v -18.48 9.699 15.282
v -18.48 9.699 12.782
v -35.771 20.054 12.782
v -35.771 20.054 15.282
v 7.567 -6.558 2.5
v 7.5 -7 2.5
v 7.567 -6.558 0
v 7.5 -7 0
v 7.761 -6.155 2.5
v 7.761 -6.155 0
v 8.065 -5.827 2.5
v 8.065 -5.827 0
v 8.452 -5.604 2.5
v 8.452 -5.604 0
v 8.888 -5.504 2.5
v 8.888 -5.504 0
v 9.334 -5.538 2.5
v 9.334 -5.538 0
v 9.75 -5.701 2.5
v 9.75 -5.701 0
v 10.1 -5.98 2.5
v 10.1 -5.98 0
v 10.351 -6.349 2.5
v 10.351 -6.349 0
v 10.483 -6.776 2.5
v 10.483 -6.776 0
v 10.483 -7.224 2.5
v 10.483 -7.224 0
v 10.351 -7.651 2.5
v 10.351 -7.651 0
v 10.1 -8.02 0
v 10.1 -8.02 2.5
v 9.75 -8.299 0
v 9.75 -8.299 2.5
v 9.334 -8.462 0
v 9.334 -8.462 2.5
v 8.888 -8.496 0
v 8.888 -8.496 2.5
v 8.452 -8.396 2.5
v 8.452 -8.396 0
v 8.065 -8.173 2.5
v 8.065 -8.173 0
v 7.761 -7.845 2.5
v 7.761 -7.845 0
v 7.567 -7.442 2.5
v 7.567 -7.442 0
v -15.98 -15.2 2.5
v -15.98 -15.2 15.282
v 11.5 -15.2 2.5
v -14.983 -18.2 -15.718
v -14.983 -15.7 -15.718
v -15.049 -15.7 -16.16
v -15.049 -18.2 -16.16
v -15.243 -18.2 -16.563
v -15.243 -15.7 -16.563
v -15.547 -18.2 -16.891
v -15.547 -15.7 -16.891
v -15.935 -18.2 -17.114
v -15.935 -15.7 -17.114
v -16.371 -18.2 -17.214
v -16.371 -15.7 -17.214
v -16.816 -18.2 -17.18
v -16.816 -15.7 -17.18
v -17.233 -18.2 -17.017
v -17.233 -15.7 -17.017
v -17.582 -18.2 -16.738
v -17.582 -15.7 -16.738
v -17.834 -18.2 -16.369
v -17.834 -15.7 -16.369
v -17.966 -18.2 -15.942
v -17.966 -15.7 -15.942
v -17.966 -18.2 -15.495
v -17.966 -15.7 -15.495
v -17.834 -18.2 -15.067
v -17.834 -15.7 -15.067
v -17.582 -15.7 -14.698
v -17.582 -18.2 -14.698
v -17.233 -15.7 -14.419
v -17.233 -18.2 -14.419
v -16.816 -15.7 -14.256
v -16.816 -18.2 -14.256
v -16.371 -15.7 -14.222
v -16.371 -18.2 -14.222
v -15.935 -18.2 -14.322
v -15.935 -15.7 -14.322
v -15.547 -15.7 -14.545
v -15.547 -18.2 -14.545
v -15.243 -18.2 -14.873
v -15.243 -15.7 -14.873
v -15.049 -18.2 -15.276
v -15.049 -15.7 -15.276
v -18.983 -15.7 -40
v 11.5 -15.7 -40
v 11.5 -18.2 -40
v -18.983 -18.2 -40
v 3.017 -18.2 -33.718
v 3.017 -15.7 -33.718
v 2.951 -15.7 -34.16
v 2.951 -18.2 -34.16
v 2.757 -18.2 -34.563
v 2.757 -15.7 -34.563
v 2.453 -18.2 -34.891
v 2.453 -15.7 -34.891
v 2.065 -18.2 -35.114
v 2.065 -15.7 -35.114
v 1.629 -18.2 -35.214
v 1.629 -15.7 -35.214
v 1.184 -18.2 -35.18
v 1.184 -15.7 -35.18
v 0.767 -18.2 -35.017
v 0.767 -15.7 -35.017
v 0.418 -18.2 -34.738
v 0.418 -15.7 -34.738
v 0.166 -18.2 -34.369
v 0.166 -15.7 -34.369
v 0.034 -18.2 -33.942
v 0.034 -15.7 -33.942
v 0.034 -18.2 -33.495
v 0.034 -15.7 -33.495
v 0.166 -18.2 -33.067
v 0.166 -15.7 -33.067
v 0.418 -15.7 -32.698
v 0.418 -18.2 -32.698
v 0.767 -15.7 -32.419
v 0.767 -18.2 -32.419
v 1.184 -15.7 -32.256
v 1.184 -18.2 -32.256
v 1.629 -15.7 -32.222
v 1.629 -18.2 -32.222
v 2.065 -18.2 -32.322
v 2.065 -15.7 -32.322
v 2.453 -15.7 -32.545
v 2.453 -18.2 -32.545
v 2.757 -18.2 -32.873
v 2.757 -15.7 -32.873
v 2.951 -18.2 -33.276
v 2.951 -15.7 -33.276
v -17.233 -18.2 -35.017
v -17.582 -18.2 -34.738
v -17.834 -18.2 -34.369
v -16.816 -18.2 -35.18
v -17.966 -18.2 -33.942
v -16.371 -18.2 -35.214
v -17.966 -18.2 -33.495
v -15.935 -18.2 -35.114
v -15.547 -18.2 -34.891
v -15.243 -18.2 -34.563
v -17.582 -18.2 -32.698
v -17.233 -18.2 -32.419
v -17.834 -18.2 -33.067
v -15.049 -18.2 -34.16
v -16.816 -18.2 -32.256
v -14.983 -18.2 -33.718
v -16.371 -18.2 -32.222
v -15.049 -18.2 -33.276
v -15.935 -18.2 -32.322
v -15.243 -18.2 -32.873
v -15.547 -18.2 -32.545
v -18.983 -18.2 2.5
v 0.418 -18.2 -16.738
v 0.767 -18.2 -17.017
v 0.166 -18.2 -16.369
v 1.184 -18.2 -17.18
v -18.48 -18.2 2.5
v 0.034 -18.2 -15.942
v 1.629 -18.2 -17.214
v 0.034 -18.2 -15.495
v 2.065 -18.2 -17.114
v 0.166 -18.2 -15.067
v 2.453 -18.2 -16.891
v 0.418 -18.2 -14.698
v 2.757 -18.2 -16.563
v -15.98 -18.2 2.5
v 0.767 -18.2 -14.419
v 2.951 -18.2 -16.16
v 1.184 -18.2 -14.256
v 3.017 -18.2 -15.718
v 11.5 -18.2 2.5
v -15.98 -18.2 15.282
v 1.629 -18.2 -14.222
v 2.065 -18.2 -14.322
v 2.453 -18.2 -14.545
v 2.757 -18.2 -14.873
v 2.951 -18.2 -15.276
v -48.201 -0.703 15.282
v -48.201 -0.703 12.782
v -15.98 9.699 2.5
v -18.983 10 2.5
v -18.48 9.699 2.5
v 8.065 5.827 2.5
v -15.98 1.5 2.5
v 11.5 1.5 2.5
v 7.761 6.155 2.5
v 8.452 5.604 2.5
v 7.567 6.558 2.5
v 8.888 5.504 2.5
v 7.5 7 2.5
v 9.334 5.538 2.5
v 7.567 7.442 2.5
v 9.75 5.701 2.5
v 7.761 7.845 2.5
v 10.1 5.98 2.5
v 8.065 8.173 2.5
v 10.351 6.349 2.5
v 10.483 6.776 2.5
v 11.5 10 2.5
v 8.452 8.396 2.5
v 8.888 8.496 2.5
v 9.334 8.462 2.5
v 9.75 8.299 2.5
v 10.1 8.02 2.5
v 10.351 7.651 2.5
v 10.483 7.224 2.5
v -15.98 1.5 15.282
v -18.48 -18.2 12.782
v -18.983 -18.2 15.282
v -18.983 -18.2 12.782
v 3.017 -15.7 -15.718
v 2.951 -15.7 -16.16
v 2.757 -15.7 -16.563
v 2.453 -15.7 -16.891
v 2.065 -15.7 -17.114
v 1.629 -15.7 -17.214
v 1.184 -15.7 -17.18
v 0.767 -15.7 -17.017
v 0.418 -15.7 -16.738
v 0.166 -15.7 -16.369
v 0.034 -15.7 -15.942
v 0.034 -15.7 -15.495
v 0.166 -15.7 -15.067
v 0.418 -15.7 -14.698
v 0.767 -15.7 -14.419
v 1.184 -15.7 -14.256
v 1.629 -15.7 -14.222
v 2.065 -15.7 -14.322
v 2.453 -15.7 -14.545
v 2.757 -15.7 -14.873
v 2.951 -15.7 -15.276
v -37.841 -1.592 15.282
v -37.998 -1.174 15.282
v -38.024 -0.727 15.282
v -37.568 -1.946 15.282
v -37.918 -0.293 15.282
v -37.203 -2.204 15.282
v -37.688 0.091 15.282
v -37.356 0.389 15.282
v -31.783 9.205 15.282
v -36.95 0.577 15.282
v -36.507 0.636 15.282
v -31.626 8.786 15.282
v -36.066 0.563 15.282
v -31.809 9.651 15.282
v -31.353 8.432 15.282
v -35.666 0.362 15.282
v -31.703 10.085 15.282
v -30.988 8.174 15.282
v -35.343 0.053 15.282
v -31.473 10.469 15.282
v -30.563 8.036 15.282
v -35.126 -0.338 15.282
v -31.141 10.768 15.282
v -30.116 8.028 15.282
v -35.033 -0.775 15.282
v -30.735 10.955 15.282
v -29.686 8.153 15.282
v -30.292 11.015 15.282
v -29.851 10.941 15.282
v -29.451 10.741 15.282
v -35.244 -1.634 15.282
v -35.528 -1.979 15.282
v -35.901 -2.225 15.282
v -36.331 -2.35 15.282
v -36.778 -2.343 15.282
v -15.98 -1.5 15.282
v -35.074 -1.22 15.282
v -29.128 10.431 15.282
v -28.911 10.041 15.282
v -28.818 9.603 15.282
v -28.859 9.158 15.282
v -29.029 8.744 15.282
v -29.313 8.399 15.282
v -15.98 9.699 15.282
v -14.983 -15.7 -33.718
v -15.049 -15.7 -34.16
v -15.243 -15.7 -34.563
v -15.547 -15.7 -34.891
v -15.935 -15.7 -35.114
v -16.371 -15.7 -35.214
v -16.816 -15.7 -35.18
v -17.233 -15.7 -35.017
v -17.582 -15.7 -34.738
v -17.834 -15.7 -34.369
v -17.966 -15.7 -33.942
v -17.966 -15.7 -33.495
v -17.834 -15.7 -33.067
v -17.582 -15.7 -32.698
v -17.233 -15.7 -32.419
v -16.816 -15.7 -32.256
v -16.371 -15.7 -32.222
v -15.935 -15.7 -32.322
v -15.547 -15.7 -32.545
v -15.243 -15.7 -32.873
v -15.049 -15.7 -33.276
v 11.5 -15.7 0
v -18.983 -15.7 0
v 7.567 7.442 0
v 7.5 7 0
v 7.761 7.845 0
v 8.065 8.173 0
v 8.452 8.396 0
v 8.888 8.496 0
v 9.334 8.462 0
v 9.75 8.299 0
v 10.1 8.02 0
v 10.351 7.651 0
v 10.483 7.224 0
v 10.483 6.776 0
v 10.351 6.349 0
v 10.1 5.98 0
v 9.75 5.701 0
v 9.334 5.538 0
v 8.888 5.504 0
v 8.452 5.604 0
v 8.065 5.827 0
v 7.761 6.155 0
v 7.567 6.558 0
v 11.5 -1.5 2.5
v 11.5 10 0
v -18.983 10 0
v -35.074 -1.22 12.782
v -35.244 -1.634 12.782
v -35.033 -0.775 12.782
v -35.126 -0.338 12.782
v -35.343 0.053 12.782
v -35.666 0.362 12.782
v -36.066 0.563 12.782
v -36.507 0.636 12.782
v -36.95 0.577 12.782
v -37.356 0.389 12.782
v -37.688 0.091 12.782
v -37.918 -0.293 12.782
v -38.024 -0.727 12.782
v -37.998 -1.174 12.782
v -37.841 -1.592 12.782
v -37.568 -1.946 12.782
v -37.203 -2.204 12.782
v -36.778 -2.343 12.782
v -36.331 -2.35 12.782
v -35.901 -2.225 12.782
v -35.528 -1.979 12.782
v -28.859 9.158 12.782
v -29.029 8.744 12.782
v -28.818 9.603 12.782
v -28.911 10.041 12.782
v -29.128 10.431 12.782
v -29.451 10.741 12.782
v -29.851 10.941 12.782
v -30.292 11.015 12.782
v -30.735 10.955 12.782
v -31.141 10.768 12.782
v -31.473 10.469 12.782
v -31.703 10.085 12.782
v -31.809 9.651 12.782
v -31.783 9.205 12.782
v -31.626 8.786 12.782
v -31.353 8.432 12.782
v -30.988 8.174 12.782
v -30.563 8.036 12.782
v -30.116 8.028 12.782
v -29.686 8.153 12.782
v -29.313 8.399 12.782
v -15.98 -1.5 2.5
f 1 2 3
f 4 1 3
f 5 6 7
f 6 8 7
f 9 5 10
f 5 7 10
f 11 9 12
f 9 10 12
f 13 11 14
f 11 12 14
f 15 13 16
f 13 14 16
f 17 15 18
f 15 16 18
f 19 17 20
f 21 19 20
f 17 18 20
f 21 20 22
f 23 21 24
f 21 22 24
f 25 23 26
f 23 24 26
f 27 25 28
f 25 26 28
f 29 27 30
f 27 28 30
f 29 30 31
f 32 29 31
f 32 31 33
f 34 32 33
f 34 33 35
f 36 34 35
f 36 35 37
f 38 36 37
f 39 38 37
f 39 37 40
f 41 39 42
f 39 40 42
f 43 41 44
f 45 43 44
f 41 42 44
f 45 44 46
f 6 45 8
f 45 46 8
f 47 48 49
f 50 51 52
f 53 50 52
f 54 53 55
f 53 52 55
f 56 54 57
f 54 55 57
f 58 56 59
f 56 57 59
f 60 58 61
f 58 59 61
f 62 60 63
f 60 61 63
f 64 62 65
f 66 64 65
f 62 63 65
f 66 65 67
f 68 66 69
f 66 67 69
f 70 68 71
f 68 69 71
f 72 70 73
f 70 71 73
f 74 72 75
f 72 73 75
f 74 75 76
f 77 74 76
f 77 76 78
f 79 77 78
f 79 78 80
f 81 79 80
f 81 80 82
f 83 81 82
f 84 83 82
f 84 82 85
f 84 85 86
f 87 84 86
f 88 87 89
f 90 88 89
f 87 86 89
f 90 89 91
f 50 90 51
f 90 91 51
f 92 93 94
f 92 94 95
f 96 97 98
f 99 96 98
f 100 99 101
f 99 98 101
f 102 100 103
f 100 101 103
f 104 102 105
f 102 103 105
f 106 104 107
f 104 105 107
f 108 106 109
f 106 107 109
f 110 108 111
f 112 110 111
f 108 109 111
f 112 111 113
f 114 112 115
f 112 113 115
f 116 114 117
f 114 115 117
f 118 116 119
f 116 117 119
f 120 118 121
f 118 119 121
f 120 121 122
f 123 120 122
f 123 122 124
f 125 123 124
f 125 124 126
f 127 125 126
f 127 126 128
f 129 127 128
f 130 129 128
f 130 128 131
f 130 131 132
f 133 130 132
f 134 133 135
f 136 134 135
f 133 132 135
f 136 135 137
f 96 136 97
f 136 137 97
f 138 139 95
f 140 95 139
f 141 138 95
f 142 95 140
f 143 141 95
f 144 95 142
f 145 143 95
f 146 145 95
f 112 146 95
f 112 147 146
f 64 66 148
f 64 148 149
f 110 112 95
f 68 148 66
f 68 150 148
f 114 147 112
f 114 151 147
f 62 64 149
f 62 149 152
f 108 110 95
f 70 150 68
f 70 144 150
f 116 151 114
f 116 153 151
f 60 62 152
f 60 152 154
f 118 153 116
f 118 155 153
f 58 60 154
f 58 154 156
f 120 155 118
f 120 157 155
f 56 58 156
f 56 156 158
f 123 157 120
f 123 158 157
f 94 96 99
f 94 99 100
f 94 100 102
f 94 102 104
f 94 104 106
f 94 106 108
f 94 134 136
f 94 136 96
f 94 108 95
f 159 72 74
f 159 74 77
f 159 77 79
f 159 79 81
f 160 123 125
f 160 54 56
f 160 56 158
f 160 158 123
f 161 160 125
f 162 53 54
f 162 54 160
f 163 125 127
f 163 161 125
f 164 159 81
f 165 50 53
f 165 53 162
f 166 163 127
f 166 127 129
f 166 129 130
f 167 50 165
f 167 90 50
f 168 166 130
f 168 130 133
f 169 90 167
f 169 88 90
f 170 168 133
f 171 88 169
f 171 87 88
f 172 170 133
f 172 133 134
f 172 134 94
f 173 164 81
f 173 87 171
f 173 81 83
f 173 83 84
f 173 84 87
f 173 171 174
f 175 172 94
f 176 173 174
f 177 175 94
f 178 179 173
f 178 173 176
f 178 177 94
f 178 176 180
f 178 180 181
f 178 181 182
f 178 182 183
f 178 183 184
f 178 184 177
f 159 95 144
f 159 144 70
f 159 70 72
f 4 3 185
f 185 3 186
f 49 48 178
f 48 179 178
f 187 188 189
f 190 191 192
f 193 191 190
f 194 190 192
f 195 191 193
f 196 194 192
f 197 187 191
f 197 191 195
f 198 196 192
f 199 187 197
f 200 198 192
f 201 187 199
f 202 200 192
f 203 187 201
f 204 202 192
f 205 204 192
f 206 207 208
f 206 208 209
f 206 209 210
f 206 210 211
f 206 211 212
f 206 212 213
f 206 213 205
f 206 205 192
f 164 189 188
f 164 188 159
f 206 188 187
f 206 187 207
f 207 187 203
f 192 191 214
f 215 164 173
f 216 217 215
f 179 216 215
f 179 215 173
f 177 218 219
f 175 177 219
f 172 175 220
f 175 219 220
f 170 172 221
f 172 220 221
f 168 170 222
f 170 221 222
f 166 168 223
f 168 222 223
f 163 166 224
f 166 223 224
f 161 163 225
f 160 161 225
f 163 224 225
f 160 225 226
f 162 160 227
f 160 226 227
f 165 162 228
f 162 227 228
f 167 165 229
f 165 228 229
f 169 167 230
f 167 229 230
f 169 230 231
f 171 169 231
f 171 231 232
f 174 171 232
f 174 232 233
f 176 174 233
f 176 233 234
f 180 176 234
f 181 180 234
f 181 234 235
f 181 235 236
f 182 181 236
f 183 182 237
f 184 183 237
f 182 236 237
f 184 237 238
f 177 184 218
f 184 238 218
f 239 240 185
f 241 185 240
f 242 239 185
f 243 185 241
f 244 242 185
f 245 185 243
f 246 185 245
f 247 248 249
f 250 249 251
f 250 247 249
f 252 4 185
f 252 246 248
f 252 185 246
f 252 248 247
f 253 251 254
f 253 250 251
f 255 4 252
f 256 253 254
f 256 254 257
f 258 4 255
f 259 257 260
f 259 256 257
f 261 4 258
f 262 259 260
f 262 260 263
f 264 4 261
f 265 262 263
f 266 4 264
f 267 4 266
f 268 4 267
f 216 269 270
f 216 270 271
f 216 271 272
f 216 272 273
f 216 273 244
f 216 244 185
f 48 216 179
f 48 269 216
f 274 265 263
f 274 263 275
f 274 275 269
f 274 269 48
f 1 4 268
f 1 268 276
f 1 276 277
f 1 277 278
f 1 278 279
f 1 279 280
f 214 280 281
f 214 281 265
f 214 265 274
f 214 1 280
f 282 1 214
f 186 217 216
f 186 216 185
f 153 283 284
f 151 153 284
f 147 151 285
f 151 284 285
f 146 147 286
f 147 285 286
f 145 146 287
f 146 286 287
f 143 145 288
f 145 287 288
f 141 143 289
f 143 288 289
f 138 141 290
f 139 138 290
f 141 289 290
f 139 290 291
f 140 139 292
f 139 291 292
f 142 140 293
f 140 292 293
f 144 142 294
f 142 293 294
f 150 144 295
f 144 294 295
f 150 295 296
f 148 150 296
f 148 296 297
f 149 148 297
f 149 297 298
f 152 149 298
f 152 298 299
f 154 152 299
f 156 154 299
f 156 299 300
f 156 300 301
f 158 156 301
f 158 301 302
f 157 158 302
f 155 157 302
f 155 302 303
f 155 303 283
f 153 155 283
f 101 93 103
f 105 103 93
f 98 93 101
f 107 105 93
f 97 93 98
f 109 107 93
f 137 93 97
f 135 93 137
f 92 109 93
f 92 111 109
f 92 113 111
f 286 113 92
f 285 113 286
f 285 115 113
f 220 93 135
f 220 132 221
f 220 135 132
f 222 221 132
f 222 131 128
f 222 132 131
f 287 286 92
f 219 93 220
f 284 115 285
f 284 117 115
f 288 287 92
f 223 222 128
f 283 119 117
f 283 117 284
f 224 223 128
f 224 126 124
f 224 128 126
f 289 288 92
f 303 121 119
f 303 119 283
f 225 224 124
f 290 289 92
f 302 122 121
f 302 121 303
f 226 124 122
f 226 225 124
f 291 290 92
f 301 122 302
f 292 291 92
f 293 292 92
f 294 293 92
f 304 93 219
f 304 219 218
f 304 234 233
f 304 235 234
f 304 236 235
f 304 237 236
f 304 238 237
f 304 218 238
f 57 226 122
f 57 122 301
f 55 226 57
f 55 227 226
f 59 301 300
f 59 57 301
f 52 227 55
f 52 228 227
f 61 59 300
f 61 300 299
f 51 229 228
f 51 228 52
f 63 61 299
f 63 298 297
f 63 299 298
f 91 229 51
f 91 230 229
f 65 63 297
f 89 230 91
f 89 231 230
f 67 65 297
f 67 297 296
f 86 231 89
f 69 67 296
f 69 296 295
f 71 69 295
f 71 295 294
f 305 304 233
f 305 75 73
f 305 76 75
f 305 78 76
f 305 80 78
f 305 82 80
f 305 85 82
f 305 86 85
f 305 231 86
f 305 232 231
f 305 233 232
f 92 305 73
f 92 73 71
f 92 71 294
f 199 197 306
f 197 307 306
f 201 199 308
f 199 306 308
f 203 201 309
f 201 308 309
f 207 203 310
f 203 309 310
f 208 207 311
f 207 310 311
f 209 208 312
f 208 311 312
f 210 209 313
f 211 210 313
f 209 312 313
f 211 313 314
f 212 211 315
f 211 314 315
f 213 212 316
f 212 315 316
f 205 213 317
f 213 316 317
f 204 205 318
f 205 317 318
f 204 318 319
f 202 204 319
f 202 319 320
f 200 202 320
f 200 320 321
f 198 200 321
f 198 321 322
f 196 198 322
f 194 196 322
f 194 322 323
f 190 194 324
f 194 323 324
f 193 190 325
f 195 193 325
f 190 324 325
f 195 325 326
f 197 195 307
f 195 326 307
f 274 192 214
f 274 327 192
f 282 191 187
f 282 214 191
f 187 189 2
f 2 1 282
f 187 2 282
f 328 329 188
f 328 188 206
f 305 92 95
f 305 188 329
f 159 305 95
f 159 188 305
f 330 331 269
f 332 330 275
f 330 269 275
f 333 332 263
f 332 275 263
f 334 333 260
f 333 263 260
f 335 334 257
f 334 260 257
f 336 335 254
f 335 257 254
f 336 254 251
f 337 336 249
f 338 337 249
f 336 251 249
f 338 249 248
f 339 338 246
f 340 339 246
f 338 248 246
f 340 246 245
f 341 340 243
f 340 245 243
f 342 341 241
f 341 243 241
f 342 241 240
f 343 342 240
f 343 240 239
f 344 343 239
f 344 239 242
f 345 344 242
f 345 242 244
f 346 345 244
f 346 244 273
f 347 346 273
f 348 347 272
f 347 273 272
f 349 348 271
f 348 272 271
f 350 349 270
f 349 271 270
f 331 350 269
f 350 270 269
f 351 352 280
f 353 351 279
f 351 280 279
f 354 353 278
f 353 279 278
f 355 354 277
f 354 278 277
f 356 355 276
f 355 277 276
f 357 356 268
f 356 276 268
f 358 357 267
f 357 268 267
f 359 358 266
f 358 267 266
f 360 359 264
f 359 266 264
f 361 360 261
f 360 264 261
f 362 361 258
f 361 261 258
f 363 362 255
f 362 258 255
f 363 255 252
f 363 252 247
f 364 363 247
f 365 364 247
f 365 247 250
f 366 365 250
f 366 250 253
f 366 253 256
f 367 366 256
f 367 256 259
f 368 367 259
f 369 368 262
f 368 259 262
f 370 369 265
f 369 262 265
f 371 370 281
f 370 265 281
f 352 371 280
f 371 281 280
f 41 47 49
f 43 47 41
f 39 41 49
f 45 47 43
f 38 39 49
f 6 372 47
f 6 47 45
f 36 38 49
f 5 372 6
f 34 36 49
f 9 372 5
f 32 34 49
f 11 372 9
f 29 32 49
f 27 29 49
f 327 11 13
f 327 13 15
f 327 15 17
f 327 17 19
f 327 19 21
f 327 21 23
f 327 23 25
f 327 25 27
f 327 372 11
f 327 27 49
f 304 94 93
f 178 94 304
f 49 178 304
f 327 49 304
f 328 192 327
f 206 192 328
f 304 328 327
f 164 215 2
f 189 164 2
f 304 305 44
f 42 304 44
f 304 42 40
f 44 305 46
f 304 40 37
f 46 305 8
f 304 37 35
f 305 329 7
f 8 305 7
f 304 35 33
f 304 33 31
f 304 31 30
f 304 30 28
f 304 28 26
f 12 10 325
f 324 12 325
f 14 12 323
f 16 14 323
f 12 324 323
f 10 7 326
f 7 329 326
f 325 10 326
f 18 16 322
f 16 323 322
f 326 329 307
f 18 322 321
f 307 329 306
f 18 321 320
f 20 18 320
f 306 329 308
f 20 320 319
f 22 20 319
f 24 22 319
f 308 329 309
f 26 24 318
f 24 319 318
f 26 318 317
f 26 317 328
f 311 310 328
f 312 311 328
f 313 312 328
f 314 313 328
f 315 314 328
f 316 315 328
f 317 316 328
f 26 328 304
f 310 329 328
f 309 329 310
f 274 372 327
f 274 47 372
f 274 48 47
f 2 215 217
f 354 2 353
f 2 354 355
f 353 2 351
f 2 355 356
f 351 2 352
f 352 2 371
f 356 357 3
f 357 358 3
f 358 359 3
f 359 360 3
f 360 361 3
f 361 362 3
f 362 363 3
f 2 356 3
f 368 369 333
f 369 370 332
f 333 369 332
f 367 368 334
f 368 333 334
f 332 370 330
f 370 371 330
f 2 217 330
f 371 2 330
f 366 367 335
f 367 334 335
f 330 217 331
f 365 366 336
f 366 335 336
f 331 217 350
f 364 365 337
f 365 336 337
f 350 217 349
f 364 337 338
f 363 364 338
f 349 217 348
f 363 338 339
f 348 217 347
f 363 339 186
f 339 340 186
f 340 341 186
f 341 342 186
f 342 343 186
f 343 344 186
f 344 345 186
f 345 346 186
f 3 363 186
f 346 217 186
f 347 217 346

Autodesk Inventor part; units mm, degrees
ref_plane "YZ Plane" through (0, 0, 0) normal (1, 0, 0) x (0, 1, 0)
ref_plane "XZ Plane" through (0, 0, 0) normal (0, 1, 0) x (-1, 0, 0)
ref_plane "XY Plane" through (0, 0, 0) normal (0, 0, 1) x (1, 0, 0)
sketch "Sketch1" plane through (0, 0, 0) normal (0, 0, 1) x (1, 0, 0)
  line L0 (-18.9826, -15.7) -> (4.0174, -15.7) projected
  line L1 (11.5, 10) -> (11.5, -10) projected
  line L2 (11.5, -10) -> (-11.5, -10) projected
  line L3 (-11.5, -10) -> (-11.5, 10) projected
  line L4 (-11.5, 10) -> (11.5, 10) projected
  line L5 (-18.9826, -15.7) -> (-18.9826, -14) projected
  line L6 (-18.9826, -15.7) -> (-18.9826, -18.2)
  line L7 (-18.9826, -18.2) -> (11.5, -18.2)
  line L8 (11.5, -18.2) -> (11.5, 10)
  line L9 (11.5, 10) -> (-18.9826, 10)
  line L10 (-18.9826, 10) -> (-18.9826, -18.2)
  point P0 (0, 0)
  dimension "d0" = 2.5
extrude "Extrusion1" add sketch "Sketch1" along normal blind 2.5
sketch "Sketch2" plane through (0, 0, 0) normal (0, 0, -1) x (-1, 0, 0)
  line L0 (18.9826, 10) -> (18.9826, -18.2) projected
  line L1 (-11.5, -18.2) -> (-11.5, 10) projected
  line L2 (18.9826, -18.2) -> (-11.5, -18.2)
  line L3 (-11.5, -18.2) -> (-11.5, -15.7)
  line L4 (-11.5, -15.7) -> (18.9826, -15.7)
  line L5 (18.9826, -15.7) -> (18.9826, -18.2)
  point P0 (0, 0)
  dimension "d3" = 2.5
extrude "Extrusion2" add sketch "Sketch2" along normal blind 40
sketch "Sketch4" plane through (-18.9826, -15.7, 0) normal (0, 1, 0) x (1, 0, 0)
  line L0 (23, 13.2181) -> (23, 36.2181) projected
  line L1 (23, 36.2181) -> (0, 36.2181) projected
  line L2 (0, 36.2181) -> (0, 13.2181) projected
  line L3 (0, 13.2181) -> (23, 13.2181) projected
  circle A0 centre (20.5, 15.7181) radius 1.5 projected
  circle A1 centre (20.5, 33.7181) radius 1.5 projected
  circle A2 centre (2.5, 33.7181) radius 1.5 projected
  circle A3 centre (2.5, 15.7181) radius 1.5 projected
  point P0 (18.9826, 0)
extrude "Extrusion3" cut sketch "Sketch4" against normal blind 40 contours A0 | A1 | A2 | A3
sketch "Sketch5" plane through (0, 0, 0) normal (0, 0, -1) x (-1, 0, 0)
  line L0 (9.8803, 8.3507) -> (9.8803, -8.3507) projected
  line L1 (9.8803, -8.3507) -> (5.0848, -8.3507) projected
  line L2 (5.0848, -8.3507) -> (5.0848, 8.3507) projected
  line L3 (5.0848, 8.3507) -> (9.8803, 8.3507) projected
  line L4 (-11.5, -10) -> (11.5, -10) projected
  line L5 (11.5, -10) -> (11.5, 10) projected
  line L6 (11.5, 10) -> (-11.5, 10) projected
  line L7 (-11.5, 10) -> (-11.5, -10) projected
  circle A0 centre (-9, -7) radius 1.5 projected
  circle A1 centre (-9, 7) radius 1.5 projected
  point P0 (0, 0)
extrude "Extrusion4" cut sketch "Sketch5" against normal blind 40 contours A0 | A1
ref_plane "Work Plane1" through (-2.2662, 39.9957, 12.7819) normal (0, 0, 1) x (-0.8579373, 0.5137544, 0)
sketch "Sketch6" plane through (-2.2662, 39.9957, 12.7819) normal (0, 0, 1) x (-0.8579373, 0.5137544, 0)
  line L0 (18.5, 0) -> (18.5, 93.5988) projected
  line L1 (-1.5, 0) -> (-1.5, 93.5988) projected
  line L2 (21.5, 18.6957) -> (-3.5, 18.6957) projected
  line L3 (-4.5, 75.0357) -> (21.5, 75.0357) projected
  line L4 (-15.5567, 58.5163) -> (-41.7088, 42.8558) projected
  line L5 (-15.5567, 58.5163) -> (18.5, 58.5163)
  line L6 (-27.221, 18.662) -> (-1.0688, 34.3225) projected
  line L7 (-1.0688, 34.3225) -> (18.5, 34.3225)
  line L8 (-1.5, 34.0643) -> (-15.9879, 58.2581)
  line L9 (-1.0688, 34.3225) -> (-1.6546, 34.3225)
  point P0 (-22.4922, 33.1495)
extrude "Extrusion5" add sketch "Sketch6" along normal blind 2.5 contours L7 L9 L1 L5 L0 | L1 L9 L8 L4 L5
sketch "Sketch7" plane through (-2.2662, 39.9957, 15.2819) normal (0, 0, 1) x (0.8579373, -0.5137544, 0)
  line L0 (15.5567, -58.5163) -> (41.7088, -42.8558) projected
  line L1 (15.9879, -58.2581) -> (18.1327, -56.9738)
  line L2 (1.6546, -34.3225) -> (-18.5, -34.3225) projected
  line L3 (1.6546, -34.3225) -> (5.6436, -31.9338)
  line L4 (15.9879, -58.2581) -> (1.6546, -34.3225) projected
  line L5 (18.1327, -56.9738) -> (1.8582, -29.7964)
  point P0 (22.4922, -33.1495)
  point P1 (3.7995, -33.0381)
  dimension "d12" = 2.5
  dimension "d13" = 2.5
extrude "Extrusion6" add sketch "Sketch7" against normal up to surface (12.7819 mm away)
sketch "Sketch8" plane through (-18.9826, -18.2, -40) normal (0, -1, 0) x (1, 0, 0)
  line L0 (3.0026, 55.2819) -> (3.0026, 42.5) projected
  line L1 (30.4826, 0) -> (30.4826, 42.5) projected
  line L2 (3.0026, 55.2819) -> (30.4826, 42.5)
  line L3 (30.4826, 42.5) -> (3.0026, 42.5)
  point P0 (18.9826, 40)
extrude "Extrusion7" add sketch "Sketch8" against normal blind 3
ref_plane "Work Plane4" through (9, 0, 0) normal (0, 1, 0) x (0, 0, 1)
ref_plane "Work Plane2" through (9, -7, 0) normal (0, 1, 0) x (0, 0, 1)
ref_plane "Work Plane3" through (9, 7, 2.5) normal (0, 1, 0) x (0, 0, -1)
sketch "Sketch9" plane through (9, 0, 0) normal (0, 1, 0) x (0, 0, 1)
  line L0 (-40, 2.5) -> (2.5, 2.5) projected
  line L1 (15.2819, -24.98) -> (15.2819, -27.48) projected
  line L2 (2.5, 2.5) -> (15.2819, -24.98)
  line L3 (15.2819, -24.98) -> (2.5, -24.98)
  line L4 (2.5, -24.98) -> (15.2819, -24.98)
  line L5 (2.5, 2.5) -> (2.5, -27.9826) projected
  line L6 (2.5, -24.98) -> (2.5, 2.5)
  point P0 (0, -9)
extrude "Extrusion8" add sketch "Sketch9" along normal mid plane 3
sketch "Sketch10" plane through (-2.2662, 39.9957, 15.2819) normal (0, 0, 1) x (0.8579373, -0.5137544, 0)
  line L0 (-6.3751, 0) -> (-6.3751, -93.5988) projected
  line L1 (-10.4351, 0) -> (-10.4351, -93.5988) projected
  line L2 (-6.3751, -46.7994) -> (-10.4351, -46.7994)
  circle A0 centre (-8.4051, -46.7994) radius 1.5
  line L3 (1.6546, -34.3225) -> (-18.5, -34.3225) projected
  line L4 (-6.3751, -34.3225) -> (-6.3751, -46.7994)
  line L5 (-6.3751, -40.561) -> (-10.4351, -40.561)
  line L6 (-18.5, -58.5163) -> (15.5567, -58.5163) projected
  line L7 (-6.3751, -58.5163) -> (-6.3751, -46.7994)
  line L8 (-6.3751, -52.6579) -> (-10.4351, -52.6579)
  circle A1 centre (-8.4051, -52.6579) radius 1.5
  circle A2 centre (-8.4051, -40.561) radius 1.5
  point P0 (22.4922, -33.1495)
  dimension "d22" = 3
  dimension "d23" = 3
  dimension "d24" = 3
extrude "Extrusion9" cut sketch "Sketch10" against normal blind 3 contours A2 L5 | L5 A2 | A1 L8 | L8 A1
properties part number "counter_sensor_holders" material "PET Plastic"
